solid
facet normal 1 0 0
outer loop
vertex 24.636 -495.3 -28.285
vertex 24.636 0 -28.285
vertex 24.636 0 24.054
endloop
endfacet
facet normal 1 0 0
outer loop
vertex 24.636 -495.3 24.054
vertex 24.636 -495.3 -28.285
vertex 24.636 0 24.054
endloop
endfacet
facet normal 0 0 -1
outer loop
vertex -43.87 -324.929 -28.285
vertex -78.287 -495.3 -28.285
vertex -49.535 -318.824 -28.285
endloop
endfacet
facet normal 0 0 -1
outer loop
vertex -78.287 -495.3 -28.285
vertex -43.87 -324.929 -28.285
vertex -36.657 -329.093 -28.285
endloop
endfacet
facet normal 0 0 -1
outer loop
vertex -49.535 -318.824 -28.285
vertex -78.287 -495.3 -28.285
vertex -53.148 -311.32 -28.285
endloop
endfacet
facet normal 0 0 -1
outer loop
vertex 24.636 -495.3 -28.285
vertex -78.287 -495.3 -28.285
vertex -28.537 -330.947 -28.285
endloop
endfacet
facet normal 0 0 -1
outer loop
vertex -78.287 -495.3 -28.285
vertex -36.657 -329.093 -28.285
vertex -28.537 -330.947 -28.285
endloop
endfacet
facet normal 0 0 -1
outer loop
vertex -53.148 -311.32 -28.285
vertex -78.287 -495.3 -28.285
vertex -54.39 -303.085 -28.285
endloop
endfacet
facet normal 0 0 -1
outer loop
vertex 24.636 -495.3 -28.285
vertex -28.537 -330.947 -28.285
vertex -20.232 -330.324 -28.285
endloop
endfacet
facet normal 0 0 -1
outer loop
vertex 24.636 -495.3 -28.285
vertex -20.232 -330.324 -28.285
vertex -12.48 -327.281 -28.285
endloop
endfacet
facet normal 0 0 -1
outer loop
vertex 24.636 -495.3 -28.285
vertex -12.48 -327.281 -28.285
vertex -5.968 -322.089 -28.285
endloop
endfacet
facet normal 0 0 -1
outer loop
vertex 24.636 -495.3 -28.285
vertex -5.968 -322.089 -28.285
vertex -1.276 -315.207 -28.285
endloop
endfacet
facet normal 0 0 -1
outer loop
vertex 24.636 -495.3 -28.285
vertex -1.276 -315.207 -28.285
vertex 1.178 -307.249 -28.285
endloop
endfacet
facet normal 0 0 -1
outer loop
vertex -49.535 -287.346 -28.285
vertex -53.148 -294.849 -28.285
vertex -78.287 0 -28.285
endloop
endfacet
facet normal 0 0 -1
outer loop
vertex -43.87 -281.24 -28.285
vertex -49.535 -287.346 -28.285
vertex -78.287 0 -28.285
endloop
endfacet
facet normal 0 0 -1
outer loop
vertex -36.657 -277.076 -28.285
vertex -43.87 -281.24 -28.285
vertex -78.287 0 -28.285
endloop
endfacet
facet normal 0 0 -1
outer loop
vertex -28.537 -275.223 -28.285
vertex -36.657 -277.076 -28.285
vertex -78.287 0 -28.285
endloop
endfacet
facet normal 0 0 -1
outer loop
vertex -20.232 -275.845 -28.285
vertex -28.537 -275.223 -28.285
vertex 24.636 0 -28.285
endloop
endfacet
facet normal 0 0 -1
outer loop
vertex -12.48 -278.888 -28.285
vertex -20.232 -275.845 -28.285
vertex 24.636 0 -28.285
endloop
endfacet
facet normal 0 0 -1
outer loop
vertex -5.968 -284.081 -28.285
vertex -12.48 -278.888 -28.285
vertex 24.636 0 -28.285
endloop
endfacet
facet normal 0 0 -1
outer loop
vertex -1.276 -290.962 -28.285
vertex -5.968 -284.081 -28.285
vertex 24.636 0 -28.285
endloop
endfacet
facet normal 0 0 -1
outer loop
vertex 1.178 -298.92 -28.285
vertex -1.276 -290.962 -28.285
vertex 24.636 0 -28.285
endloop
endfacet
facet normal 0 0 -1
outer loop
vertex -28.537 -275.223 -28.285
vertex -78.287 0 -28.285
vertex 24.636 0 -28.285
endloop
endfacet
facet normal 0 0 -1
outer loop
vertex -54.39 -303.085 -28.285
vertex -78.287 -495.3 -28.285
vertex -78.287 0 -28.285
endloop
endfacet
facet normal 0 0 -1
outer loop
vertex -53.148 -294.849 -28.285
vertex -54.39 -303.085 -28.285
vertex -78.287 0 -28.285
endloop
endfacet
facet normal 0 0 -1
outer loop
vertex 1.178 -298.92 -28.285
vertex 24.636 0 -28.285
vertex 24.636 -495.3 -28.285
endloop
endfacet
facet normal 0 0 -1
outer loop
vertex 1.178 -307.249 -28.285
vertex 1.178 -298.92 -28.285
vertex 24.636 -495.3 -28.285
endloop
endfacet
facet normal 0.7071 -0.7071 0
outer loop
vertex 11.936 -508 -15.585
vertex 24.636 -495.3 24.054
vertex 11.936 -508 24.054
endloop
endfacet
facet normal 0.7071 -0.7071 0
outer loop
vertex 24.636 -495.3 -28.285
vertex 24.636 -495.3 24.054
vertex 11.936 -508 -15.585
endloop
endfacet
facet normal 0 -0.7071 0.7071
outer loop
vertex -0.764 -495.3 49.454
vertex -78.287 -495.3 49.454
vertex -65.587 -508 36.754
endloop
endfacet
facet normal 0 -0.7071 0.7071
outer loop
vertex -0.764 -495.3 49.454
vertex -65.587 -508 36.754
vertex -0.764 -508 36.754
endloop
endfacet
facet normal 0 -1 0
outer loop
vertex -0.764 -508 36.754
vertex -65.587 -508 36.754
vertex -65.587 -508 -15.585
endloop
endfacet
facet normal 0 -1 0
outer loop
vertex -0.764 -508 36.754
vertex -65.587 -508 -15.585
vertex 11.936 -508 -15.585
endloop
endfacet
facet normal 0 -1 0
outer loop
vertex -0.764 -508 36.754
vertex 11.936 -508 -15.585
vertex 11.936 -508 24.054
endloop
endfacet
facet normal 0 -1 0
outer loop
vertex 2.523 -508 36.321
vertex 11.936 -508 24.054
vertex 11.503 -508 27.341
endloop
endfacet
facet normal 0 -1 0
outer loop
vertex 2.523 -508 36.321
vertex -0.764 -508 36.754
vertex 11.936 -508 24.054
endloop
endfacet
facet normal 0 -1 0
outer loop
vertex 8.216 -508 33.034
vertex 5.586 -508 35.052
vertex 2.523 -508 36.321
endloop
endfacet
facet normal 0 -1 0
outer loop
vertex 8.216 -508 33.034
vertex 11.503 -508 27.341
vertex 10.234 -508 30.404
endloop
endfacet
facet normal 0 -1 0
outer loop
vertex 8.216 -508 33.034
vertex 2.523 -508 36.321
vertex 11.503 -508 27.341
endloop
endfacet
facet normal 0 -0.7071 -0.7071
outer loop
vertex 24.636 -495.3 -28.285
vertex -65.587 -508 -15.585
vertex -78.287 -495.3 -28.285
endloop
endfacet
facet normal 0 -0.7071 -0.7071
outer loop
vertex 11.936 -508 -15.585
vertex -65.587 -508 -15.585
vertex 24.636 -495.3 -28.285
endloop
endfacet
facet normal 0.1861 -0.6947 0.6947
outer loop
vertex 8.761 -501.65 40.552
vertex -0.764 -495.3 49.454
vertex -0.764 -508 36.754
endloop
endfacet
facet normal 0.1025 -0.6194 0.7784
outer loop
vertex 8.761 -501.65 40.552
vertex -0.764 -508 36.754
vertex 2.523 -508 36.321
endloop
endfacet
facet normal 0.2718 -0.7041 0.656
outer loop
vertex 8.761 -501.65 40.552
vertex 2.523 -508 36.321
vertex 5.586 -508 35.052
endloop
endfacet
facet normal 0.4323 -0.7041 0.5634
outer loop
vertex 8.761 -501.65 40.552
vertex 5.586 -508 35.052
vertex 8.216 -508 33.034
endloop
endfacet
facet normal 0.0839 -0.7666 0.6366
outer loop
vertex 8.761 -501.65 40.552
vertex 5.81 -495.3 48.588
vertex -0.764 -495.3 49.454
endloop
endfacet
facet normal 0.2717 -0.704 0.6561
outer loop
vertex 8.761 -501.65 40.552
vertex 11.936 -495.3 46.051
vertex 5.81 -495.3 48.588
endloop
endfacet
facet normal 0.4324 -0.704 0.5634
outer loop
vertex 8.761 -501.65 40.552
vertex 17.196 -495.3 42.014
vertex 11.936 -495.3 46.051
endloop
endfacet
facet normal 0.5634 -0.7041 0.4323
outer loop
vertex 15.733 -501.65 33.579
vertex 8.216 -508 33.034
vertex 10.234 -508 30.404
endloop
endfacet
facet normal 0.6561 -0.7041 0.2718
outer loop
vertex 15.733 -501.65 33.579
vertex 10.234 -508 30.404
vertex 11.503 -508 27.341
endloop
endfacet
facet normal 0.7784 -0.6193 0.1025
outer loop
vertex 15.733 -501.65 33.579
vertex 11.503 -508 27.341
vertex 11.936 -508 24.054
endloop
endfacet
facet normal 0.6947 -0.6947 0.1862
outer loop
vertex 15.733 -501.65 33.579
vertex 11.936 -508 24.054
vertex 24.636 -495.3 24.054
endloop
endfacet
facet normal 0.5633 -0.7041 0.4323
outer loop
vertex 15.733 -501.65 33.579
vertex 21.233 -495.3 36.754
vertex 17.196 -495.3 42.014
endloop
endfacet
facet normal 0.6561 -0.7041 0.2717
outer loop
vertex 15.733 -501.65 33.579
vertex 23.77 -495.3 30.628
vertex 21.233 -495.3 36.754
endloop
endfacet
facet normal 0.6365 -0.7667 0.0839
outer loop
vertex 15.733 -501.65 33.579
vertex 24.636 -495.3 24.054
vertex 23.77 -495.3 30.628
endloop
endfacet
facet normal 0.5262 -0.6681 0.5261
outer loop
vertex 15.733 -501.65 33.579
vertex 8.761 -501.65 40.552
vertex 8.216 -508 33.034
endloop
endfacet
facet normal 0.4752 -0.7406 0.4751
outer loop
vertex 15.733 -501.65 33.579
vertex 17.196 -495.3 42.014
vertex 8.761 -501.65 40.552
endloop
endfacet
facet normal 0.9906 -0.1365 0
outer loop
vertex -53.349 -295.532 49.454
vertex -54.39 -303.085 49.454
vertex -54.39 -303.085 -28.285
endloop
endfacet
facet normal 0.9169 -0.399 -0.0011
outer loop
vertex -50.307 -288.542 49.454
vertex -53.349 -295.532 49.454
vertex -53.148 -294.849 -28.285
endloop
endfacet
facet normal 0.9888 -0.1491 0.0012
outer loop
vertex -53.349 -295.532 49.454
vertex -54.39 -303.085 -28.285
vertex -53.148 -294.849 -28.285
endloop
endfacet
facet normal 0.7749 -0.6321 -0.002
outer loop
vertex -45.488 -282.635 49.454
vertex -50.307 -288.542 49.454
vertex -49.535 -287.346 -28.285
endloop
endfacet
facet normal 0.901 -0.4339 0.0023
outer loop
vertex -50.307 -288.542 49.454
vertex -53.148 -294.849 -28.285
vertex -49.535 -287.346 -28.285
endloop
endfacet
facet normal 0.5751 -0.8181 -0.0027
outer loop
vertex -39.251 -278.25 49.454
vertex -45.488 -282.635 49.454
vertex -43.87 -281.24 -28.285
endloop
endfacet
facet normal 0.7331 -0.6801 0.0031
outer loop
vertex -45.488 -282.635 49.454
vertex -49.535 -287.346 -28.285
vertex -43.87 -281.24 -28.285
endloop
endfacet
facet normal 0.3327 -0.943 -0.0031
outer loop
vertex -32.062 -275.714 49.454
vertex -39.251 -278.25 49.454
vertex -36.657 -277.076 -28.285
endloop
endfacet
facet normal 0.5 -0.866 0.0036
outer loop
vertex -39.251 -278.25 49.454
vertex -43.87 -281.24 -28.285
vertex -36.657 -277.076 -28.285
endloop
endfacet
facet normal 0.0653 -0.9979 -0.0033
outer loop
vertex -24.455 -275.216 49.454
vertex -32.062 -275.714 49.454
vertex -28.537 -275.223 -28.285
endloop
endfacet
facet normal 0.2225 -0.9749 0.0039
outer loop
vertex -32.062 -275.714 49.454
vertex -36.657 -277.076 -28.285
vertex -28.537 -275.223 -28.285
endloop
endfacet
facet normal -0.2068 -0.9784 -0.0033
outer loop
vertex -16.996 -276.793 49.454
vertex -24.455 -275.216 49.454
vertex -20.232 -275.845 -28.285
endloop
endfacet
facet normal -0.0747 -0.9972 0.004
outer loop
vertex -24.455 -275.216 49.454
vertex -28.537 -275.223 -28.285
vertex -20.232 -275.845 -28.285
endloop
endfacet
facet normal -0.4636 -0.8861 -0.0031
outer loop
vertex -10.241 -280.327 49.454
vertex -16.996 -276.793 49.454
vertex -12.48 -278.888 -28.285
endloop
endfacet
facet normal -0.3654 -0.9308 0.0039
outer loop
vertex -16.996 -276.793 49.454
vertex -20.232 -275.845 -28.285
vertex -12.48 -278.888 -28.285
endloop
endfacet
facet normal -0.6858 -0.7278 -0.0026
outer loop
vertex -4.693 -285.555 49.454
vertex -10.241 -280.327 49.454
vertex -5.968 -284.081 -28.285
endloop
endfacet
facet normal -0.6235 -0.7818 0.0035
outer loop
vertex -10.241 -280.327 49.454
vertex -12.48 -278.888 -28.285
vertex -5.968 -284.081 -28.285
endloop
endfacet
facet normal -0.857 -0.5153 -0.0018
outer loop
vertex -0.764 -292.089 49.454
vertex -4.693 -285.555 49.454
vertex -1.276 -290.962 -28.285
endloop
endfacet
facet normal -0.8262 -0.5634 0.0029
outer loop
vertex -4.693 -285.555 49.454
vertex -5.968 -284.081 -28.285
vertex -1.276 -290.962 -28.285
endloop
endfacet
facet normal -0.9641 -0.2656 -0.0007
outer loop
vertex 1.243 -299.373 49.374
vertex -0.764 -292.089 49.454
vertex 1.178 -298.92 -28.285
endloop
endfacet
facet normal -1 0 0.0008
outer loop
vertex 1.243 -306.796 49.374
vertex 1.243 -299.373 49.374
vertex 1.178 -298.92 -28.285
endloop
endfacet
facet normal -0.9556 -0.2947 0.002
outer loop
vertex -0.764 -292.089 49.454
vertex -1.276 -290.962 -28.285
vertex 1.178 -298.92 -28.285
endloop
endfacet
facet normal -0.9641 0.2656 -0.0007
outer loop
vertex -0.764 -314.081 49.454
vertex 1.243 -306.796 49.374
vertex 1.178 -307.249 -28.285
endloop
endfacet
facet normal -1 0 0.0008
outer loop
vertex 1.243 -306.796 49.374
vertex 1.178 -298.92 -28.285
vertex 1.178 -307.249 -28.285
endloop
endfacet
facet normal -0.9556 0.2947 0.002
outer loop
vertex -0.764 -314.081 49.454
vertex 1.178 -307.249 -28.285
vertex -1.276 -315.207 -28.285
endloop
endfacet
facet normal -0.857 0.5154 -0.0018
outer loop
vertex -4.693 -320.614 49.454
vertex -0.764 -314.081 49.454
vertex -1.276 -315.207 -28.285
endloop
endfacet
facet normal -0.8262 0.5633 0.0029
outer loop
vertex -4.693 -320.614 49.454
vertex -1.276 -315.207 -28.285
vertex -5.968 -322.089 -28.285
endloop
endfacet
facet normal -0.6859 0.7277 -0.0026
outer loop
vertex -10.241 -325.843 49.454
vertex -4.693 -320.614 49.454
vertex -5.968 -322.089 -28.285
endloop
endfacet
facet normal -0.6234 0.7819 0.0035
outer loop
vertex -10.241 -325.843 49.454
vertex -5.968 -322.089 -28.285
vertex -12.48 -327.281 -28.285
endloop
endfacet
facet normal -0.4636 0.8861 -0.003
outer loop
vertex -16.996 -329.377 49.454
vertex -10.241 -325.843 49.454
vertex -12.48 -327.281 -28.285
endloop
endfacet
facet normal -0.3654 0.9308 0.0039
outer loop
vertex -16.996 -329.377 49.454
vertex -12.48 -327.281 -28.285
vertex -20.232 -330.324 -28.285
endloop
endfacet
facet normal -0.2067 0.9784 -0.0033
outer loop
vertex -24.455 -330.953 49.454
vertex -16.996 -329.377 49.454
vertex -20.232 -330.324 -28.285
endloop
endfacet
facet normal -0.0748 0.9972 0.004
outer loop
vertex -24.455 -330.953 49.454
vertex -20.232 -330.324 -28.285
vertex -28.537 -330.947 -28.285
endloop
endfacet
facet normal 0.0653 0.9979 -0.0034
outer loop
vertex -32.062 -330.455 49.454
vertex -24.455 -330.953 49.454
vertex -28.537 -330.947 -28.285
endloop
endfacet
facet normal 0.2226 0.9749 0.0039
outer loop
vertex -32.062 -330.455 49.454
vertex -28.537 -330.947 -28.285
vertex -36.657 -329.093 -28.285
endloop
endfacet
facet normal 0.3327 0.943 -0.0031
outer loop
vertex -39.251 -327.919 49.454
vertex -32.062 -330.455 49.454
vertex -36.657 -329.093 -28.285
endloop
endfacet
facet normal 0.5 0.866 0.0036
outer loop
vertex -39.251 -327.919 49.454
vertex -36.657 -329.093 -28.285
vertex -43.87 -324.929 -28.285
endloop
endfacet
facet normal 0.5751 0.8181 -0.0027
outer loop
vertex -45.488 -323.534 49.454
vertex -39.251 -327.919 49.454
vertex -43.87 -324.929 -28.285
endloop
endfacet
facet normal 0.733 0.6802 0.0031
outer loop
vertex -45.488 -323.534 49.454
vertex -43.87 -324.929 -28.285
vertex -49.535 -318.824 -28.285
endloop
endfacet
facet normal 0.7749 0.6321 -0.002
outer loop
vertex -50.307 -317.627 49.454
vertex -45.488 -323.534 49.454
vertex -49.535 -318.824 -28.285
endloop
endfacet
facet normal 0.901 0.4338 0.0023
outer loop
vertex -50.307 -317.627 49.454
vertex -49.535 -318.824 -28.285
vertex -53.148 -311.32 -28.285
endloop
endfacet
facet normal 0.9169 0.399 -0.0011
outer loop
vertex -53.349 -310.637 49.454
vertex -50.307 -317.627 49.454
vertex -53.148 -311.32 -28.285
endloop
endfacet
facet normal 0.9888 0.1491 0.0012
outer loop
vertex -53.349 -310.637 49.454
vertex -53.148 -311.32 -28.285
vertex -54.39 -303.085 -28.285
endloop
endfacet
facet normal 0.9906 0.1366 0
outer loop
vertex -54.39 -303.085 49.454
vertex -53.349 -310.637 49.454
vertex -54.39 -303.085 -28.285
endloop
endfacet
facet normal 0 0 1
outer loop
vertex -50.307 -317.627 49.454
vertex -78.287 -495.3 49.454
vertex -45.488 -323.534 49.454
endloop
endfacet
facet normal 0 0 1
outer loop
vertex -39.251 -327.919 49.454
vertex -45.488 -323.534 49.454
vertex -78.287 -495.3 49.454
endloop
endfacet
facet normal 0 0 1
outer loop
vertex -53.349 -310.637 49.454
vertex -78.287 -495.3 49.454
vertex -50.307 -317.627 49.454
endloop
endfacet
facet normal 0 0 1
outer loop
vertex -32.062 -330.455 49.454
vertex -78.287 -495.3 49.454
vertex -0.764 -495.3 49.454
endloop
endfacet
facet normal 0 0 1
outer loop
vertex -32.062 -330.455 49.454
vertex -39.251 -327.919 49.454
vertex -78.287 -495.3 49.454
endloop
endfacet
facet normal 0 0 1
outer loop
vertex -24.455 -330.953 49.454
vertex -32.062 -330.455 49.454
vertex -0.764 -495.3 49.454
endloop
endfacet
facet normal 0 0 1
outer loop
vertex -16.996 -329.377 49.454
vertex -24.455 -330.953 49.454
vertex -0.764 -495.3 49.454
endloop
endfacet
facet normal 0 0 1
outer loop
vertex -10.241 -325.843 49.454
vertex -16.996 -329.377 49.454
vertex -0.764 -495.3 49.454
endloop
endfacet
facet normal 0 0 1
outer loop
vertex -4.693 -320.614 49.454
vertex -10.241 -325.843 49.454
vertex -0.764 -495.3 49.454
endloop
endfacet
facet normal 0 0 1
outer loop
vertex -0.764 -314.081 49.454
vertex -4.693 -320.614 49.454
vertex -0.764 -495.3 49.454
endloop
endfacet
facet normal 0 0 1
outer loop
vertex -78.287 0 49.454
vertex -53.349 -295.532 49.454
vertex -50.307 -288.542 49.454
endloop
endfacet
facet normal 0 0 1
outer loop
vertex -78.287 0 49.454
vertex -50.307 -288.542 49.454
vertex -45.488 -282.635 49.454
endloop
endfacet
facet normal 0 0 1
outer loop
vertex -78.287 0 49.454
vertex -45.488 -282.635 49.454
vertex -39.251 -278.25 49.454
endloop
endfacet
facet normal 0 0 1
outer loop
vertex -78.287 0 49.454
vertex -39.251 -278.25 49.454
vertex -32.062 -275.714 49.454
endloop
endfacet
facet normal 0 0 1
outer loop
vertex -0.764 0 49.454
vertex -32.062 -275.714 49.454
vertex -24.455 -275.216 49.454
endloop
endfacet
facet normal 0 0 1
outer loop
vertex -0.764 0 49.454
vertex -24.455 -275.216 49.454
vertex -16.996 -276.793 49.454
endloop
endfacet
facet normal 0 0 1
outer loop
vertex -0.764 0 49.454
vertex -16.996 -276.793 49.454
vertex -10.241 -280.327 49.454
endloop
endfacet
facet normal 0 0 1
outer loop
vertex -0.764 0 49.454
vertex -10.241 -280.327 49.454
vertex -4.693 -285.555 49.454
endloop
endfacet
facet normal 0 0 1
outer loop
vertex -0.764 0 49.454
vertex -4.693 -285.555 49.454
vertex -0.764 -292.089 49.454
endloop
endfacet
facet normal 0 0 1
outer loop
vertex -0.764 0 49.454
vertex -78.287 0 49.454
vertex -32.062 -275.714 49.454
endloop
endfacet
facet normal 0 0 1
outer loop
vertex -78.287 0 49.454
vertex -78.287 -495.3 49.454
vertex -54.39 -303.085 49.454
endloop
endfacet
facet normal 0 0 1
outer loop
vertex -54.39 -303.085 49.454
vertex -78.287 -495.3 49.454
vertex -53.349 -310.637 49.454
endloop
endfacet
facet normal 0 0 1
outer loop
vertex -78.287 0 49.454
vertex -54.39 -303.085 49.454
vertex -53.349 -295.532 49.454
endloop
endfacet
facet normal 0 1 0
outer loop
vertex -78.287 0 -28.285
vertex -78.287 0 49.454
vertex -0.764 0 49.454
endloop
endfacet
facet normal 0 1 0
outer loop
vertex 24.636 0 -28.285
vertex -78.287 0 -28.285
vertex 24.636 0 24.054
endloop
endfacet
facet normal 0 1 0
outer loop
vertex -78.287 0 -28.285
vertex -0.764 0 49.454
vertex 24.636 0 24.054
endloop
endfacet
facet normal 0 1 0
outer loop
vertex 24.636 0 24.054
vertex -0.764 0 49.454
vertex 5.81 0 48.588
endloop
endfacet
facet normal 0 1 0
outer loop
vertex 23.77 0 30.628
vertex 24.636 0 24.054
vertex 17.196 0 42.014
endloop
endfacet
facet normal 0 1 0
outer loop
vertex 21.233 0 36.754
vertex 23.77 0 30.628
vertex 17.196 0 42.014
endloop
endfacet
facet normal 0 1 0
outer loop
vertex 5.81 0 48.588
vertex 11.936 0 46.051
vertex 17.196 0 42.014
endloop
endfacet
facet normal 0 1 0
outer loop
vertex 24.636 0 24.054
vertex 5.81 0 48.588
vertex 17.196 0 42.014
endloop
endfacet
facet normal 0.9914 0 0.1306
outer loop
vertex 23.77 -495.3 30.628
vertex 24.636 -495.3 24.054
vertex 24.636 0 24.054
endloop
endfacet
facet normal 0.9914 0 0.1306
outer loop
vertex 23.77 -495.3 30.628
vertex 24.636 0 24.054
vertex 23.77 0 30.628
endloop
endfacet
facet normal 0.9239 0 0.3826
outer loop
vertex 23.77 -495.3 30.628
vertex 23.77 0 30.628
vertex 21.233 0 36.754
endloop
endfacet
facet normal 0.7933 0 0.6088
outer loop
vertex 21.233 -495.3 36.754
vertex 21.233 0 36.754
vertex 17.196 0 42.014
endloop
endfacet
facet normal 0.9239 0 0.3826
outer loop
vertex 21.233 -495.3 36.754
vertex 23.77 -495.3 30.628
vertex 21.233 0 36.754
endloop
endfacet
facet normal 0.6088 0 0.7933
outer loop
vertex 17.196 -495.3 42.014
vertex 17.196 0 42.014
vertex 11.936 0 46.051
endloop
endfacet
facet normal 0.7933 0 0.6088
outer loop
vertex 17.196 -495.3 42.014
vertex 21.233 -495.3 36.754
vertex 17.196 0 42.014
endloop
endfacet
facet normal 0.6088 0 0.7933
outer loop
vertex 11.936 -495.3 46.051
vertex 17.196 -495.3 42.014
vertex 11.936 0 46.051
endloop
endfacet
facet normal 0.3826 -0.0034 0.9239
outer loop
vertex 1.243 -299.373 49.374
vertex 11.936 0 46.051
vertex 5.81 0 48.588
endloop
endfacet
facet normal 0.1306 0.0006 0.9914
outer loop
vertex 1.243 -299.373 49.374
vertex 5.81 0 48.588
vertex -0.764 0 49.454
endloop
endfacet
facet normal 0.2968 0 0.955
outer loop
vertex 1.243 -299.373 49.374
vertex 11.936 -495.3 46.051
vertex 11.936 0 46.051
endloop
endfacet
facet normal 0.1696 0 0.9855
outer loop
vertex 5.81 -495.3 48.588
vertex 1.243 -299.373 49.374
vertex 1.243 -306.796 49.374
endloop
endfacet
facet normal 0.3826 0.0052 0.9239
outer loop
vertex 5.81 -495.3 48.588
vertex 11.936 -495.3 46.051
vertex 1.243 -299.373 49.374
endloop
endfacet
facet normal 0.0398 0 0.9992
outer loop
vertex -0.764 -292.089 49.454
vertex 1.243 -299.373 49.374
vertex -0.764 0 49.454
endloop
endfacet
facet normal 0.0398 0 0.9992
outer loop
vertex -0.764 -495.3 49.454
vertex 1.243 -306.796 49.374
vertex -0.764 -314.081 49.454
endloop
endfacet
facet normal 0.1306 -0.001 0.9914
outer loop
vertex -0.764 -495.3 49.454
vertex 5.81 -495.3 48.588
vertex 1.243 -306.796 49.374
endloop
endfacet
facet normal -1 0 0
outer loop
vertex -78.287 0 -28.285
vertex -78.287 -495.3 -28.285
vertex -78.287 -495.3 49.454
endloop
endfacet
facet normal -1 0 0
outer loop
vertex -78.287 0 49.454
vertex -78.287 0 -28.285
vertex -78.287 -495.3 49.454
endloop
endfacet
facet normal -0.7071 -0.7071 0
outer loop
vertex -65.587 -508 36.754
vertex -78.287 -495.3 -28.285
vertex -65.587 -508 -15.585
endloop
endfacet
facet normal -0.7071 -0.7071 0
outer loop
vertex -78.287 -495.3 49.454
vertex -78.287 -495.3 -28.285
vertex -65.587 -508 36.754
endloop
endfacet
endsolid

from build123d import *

# Parameters (mm, degrees)
F0_W     = 102.922255
F0_H     = 77.739151
F1_DEPTH = 508
F2_R     = 25.4
F4_D     = 55.88
F5_SIZE  = 12.7


with BuildPart() as f1:
    # F0 (on Front) → F1 (new body)
    with BuildSketch(Plane.XZ):
        with Locations((-26.825475, 10.584204)):
            Rectangle(F0_W, F0_H)
    extrude(amount=F1_DEPTH)

    # F2
    f2_edges = [f1.edges().sort_by_distance(p)[0] for p in [
        (24.635652, -254, 49.45378),
    ]]
    fillet(f2_edges, radius=F2_R)

    # F4 (through all)
    with Locations(Plane.XY.offset(49.45378)):
        with Locations((-26.449531, -303.084731)):
            Hole(F4_D / 2)

    # F5
    f5_edges = [f1.edges().sort_by_distance(p)[0] for p in [
        (-39.525476, -508, 49.45378),
        (17.196164, -508, 42.014292),
        (-78.286603, -508, 10.584204),
        (24.635652, -508, -2.115796),
        (-26.825476, -508, -28.285371),
    ]]
    chamfer(f5_edges, length=F5_SIZE)


solid = f1.part
